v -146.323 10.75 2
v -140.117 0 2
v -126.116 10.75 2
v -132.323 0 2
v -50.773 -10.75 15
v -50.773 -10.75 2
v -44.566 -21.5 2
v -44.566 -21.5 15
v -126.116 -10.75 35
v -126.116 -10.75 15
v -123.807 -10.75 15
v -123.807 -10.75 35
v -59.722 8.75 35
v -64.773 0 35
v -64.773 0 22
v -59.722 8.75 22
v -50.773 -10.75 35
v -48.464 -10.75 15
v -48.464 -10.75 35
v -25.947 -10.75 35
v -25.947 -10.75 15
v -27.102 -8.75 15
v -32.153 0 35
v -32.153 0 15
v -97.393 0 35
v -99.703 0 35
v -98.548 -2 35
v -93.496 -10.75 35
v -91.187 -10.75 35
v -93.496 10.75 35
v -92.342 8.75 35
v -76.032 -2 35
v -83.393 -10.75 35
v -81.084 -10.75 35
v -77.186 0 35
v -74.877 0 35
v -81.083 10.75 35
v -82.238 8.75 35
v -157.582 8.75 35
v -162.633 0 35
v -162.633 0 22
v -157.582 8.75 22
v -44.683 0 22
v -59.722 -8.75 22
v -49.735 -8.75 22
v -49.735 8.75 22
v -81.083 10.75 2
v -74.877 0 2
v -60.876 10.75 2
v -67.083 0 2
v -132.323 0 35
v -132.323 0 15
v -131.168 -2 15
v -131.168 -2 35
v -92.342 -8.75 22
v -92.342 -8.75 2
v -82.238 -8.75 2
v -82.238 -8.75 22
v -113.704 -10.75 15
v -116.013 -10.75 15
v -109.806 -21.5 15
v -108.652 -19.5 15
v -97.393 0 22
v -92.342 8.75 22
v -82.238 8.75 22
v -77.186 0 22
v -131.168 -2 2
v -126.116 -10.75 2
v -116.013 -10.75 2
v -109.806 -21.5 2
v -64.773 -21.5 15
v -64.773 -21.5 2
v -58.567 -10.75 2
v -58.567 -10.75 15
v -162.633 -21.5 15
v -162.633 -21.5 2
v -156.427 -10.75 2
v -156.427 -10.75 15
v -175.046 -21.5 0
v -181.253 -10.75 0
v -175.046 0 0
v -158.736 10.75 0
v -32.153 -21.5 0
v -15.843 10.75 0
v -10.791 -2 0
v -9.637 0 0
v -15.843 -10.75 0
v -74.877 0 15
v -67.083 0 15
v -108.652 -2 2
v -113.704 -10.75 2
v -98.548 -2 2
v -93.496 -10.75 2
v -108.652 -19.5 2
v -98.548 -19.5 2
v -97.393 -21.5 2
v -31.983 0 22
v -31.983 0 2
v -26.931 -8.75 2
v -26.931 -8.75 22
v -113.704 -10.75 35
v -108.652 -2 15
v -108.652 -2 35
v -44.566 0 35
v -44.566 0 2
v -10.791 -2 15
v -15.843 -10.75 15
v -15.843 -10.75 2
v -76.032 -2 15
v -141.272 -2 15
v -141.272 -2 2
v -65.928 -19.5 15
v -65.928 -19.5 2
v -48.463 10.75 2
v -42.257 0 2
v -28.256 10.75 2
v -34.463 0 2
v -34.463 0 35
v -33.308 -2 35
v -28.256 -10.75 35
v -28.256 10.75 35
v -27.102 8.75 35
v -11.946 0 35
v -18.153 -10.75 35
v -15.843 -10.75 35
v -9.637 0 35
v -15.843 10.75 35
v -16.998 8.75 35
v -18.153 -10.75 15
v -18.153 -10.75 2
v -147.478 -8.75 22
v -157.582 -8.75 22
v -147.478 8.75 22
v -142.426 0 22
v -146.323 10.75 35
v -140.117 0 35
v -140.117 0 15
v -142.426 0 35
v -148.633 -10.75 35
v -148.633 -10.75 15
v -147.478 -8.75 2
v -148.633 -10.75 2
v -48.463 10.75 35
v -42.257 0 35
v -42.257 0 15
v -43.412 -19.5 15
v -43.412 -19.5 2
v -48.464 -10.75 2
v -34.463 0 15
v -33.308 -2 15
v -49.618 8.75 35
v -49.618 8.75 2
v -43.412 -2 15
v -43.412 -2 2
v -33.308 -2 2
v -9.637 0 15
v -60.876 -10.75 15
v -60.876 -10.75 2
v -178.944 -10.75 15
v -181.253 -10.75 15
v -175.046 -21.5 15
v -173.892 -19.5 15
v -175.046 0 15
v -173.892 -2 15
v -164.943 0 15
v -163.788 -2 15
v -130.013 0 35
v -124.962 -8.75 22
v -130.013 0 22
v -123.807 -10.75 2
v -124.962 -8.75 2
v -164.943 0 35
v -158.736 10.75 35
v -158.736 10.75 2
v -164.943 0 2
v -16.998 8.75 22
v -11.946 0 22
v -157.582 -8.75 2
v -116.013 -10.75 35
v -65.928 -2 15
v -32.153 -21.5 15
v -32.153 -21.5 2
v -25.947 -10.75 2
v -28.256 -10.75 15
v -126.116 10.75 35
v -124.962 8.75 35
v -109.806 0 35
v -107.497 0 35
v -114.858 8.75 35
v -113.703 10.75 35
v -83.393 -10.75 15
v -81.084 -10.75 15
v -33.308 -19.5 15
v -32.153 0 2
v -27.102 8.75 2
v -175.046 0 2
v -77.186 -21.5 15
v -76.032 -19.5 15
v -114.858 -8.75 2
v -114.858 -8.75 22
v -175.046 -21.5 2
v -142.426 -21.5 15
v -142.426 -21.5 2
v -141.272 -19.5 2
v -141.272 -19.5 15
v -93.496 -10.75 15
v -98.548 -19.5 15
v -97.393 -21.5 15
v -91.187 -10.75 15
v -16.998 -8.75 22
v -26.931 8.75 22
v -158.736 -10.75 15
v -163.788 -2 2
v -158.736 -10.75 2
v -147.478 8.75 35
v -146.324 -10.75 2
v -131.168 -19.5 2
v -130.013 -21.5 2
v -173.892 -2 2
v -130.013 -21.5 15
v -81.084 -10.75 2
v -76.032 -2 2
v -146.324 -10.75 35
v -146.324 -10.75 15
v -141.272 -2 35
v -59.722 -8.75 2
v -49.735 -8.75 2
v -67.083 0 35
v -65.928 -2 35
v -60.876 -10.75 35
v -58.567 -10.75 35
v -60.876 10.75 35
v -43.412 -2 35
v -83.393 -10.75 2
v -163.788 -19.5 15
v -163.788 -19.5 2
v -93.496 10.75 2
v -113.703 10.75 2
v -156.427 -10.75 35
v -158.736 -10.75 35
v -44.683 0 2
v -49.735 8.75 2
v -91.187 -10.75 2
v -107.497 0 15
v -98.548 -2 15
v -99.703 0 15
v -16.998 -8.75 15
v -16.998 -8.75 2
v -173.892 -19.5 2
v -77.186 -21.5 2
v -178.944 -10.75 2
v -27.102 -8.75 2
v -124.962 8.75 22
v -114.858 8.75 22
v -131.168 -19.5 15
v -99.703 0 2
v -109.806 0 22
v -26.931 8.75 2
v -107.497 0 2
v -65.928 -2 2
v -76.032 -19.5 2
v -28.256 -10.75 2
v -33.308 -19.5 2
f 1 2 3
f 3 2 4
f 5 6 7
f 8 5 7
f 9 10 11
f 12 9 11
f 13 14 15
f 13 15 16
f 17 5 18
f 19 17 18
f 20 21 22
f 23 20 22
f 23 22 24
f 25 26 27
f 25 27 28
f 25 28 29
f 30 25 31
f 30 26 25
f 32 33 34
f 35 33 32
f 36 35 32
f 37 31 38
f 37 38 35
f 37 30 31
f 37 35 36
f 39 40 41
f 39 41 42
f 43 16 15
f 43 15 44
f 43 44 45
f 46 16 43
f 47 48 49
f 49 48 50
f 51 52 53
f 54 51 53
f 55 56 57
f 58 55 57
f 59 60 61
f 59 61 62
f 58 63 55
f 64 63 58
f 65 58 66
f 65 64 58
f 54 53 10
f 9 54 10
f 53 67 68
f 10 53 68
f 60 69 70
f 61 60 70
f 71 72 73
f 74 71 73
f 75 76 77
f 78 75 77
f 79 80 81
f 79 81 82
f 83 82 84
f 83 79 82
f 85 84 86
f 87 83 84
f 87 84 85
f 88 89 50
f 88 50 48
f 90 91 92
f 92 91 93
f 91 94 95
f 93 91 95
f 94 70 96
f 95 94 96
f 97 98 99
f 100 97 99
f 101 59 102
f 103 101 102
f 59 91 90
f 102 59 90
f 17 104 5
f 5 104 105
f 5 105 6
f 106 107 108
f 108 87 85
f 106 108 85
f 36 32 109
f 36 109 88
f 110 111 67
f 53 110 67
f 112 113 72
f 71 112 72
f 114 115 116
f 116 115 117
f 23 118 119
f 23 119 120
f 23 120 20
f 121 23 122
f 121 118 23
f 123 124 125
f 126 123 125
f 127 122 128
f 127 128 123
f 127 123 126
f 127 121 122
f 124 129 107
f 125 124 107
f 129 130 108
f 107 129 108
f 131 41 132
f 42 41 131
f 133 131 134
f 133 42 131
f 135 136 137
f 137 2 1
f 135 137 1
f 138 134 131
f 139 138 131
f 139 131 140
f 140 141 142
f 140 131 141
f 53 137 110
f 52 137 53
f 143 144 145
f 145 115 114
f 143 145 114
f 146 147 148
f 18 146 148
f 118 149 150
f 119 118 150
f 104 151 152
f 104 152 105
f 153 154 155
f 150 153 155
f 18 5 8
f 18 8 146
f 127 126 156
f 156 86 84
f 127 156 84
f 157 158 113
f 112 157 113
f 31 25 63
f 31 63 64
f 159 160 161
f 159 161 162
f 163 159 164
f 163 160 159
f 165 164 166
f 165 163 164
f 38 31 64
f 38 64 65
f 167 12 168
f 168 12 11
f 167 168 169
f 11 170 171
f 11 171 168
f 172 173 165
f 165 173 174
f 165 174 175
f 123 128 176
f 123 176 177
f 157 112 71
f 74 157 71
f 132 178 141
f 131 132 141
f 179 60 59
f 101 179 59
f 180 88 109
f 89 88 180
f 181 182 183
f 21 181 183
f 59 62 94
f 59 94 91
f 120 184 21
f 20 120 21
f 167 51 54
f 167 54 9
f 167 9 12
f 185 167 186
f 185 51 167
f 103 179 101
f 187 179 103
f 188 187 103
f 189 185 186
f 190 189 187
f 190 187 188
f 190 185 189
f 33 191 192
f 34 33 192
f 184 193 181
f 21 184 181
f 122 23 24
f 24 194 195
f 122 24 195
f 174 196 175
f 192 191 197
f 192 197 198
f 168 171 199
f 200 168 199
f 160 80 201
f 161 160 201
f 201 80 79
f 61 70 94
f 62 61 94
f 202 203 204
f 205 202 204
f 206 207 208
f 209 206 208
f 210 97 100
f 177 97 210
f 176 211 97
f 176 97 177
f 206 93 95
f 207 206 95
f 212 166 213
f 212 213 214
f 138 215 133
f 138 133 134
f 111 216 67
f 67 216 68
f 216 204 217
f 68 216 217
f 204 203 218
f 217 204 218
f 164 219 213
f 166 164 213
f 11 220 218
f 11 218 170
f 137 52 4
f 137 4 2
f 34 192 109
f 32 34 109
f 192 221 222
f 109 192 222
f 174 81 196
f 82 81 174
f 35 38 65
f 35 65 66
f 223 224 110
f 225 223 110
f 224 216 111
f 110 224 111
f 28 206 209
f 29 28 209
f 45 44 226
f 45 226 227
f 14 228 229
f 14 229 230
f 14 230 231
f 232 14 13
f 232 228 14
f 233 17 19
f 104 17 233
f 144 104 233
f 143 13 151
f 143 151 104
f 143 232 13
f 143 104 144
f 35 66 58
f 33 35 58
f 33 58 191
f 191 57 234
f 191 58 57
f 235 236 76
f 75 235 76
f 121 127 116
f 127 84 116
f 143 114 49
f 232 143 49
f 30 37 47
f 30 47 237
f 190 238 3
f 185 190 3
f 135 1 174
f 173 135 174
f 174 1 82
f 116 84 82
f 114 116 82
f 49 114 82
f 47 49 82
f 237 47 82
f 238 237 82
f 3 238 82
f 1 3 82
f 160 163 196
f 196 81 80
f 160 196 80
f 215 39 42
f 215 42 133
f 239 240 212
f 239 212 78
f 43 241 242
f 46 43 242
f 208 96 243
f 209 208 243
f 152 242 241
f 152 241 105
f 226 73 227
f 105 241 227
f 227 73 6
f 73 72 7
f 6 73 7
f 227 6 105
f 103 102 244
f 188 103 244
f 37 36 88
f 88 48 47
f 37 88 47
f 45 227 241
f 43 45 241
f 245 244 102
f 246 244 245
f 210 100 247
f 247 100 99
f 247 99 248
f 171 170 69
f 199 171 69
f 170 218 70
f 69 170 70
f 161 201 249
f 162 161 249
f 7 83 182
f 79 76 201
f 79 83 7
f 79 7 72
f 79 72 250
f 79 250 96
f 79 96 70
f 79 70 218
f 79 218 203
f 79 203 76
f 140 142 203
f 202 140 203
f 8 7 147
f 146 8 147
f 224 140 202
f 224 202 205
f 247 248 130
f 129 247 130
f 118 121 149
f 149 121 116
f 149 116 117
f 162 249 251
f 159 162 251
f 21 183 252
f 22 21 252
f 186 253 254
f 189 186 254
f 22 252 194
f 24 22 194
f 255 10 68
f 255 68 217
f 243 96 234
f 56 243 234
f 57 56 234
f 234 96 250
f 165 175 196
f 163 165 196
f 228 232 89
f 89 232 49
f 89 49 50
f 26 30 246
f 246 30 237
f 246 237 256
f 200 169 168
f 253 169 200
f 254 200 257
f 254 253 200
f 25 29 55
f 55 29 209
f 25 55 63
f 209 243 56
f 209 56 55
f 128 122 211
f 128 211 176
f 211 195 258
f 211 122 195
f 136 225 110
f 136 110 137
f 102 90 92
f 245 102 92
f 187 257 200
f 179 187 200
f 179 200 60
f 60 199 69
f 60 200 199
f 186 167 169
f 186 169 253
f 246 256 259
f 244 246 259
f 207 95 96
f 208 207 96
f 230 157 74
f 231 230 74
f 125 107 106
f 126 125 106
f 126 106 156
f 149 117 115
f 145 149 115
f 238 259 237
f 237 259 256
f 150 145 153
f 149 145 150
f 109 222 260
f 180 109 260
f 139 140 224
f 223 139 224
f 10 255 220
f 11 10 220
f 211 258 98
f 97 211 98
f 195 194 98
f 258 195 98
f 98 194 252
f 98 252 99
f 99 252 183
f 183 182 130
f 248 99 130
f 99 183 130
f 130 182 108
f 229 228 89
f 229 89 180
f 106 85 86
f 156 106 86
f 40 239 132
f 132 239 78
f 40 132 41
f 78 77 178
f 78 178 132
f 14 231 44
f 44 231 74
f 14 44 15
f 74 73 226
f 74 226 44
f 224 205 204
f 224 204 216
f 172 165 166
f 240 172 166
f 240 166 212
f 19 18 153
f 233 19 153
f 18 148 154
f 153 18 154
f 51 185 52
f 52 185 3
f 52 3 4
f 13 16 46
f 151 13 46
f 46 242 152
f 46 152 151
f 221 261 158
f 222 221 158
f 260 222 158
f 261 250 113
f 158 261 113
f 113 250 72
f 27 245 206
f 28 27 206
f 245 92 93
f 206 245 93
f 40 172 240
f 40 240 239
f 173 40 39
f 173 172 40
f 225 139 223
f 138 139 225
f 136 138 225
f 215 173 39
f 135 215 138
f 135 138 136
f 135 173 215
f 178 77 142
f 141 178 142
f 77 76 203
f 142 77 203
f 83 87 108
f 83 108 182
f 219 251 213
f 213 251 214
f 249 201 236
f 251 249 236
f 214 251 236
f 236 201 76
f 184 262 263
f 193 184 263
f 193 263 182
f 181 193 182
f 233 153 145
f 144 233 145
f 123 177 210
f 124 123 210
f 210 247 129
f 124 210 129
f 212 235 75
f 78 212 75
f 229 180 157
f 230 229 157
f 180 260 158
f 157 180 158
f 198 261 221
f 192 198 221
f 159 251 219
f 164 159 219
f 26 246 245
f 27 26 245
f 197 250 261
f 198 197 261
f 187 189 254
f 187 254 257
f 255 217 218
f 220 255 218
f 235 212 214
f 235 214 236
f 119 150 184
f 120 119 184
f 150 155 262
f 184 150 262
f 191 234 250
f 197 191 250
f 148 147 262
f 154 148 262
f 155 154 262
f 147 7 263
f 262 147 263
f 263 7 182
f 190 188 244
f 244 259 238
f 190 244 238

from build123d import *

# Parameters (mm, degrees)
F1_DEPTH = 15
F3_DEPTH = 2
F5_DEPTH = 20
F7_DEPTH = 20


with BuildPart() as f1:
    # F0 (on Top) → F1 (new body)
    with BuildSketch(Plane.XY):
        Polygon((-43.4116994914, -2), (-33.3080697806, -2), (-28.2562549252, -10.75), (-33.3080697806, -19.5), (-32.1533692422, -21.5), (-25.9468538484, -10.75), (-27.1015543868, -8.75), (-32.1533692422, 0), (-27.1015543868, 8.75), (-22.0497395314, 8.75), (-16.997924676, 8.75), (-11.9461098206, 0), (-14.4720172483, -4.375), (-16.997924676, -8.75), (-18.1526252144, -10.75), (-15.8432241376, -10.75), (-10.7914092822, -2), (-9.6367087438, 0), (-15.8432241376, 10.75), (-22.0497395314, 10.75), (-28.2562549252, 10.75), (-34.462770319, 0), (-42.2567087438, 0), (-48.4632241376, 10.75), (-54.6697395314, 10.75), (-60.8762549252, 10.75), (-67.082770319, 0), (-74.8767087438, 0), (-81.0832241376, 10.75), (-87.2897395314, 10.75), (-93.4962549252, 10.75), (-99.702770319, 0), (-107.4967087438, 0), (-113.7032241376, 10.75), (-119.9097395314, 10.75), (-126.1162549252, 10.75), (-132.322770319, 0), (-140.1167087438, 0), (-146.3232241376, 10.75), (-152.5297395314, 10.75), (-158.7362549252, 10.75), (-164.942770319, 0), (-175.0464000298, 0), (-181.2529154236, -10.75), (-175.0464000298, -21.5), (-173.8916994914, -19.5), (-178.9435143468, -10.75), (-173.8916994914, -2), (-163.7880697806, -2), (-158.7362549252, -10.75), (-163.7880697806, -19.5), (-162.6333692422, -21.5), (-156.4268538484, -10.75), (-162.6333692422, 0), (-157.5815543868, 8.75), (-152.5297395314, 8.75), (-147.477924676, 8.75), (-142.4261098206, 0), (-148.6329154236, -10.75), (-142.4264000298, -21.5), (-141.2716994914, -19.5), (-146.3235143468, -10.75), (-141.2716994914, -2), (-131.1680697806, -2), (-126.1162549252, -10.75), (-131.1680697806, -19.5), (-130.0133692422, -21.5), (-123.8068538484, -10.75), (-130.0133692422, 0), (-124.9615543868, 8.75), (-119.9097395314, 8.75), (-114.857924676, 8.75), (-109.8061098206, 0), (-116.0129154236, -10.75), (-109.8064000298, -21.5), (-108.6516994914, -19.5), (-113.7035143468, -10.75), (-108.6516994914, -2), (-98.5480697806, -2), (-93.4962549252, -10.75), (-98.5480697806, -19.5), (-97.3933692422, -21.5), (-91.1868538484, -10.75), (-97.3933692422, 0), (-92.3415543868, 8.75), (-87.2897395314, 8.75), (-82.237924676, 8.75), (-77.1861098206, 0), (-83.3929154236, -10.75), (-77.1864000298, -21.5), (-76.0316994914, -19.5), (-81.0835143468, -10.75), (-76.0316994914, -2), (-65.9280697806, -2), (-60.8762549252, -10.75), (-65.9280697806, -19.5), (-64.7733692422, -21.5), (-58.5668538484, -10.75), (-64.7733692422, 0), (-59.7215543868, 8.75), (-54.6697395314, 8.75), (-49.617924676, 8.75), (-44.5661098206, 0), (-50.7729154236, -10.75), (-44.5664000298, -21.5), (-43.4116994914, -19.5), (-48.4635143468, -10.75), align=None)
    extrude(amount=F1_DEPTH)

    # F2 (on face) → F3 (join)
    with BuildSketch(Plane(origin=(0, 0, 0), x_dir=(1, 0, 0), z_dir=(0, 0, -1))):
        Polygon((-32.1533692422, 21.5), (-175.0464000298, 21.5), (-181.2529154236, 10.75), (-175.0464000298, 0), (-158.7362549252, -10.75), (-15.8432241376, -10.75), (-9.6367087438, 0), (-15.8432241376, 10.75), align=None)
    extrude(amount=-F3_DEPTH)

    # F4 (on face) → F5 (join)
    with BuildSketch(Plane.XY.offset(15)):
        Polygon((-11.9461098206, 0), (-18.1526252144, -10.75), (-15.8432241376, -10.75), (-9.6367087438, 0), (-15.8432241376, 10.75), (-28.2562549252, 10.75), (-34.462770319, 0), (-33.3080697806, -2), (-28.2562549252, -10.75), (-25.9468538484, -10.75), (-32.1533692422, 0), (-27.1015543868, 8.75), (-16.997924676, 8.75), align=None)
        Polygon((-43.4116994914, -2), (-42.2567087438, 0), (-48.4632241376, 10.75), (-60.8762549252, 10.75), (-67.082770319, 0), (-65.9280697806, -2), (-60.8762549252, -10.75), (-58.5668538484, -10.75), (-64.7733692422, 0), (-59.7215543868, 8.75), (-49.617924676, 8.75), (-44.5661098206, 0), (-50.7729154236, -10.75), (-48.4635143468, -10.75), align=None)
        Polygon((-76.0316994914, -2), (-74.8767087438, 0), (-81.0832241376, 10.75), (-93.4962549252, 10.75), (-99.702770319, 0), (-98.5480697806, -2), (-93.4962549252, -10.75), (-91.1868538484, -10.75), (-97.3933692422, 0), (-92.3415543868, 8.75), (-82.237924676, 8.75), (-77.1861098206, 0), (-83.3929154236, -10.75), (-81.0835143468, -10.75), align=None)
        Polygon((-108.6516994914, -2), (-107.4967087438, 0), (-113.7032241376, 10.75), (-126.1162549252, 10.75), (-132.322770319, 0), (-131.1680697806, -2), (-126.1162549252, -10.75), (-123.8068538484, -10.75), (-130.0133692422, 0), (-124.9615543868, 8.75), (-114.857924676, 8.75), (-109.8061098206, 0), (-116.0129154236, -10.75), (-113.7035143468, -10.75), align=None)
        Polygon((-141.2716994914, -2), (-140.1167087438, 0), (-146.3232241376, 10.75), (-158.7362549252, 10.75), (-164.942770319, 0), (-158.7362549252, -10.75), (-156.4268538484, -10.75), (-162.6333692422, 0), (-157.5815543868, 8.75), (-147.477924676, 8.75), (-142.4261098206, 0), (-148.6329154236, -10.75), (-146.3235143468, -10.75), align=None)
    extrude(amount=F5_DEPTH)

    # F6 (on face) → F7 (join)
    with BuildSketch(Plane.XY.offset(2)):
        Polygon((-147.477924676, 8.75), (-157.5815543868, 8.75), (-162.6333692422, 0), (-157.5815543868, -8.75), (-147.477924676, -8.75), (-142.4261098206, 0), align=None)
        Polygon((-114.857924676, 8.75), (-124.9615543868, 8.75), (-130.0133692422, 0), (-124.9615543868, -8.75), (-114.857924676, -8.75), (-109.8061098206, 0), align=None)
        Polygon((-82.237924676, 8.75), (-92.3415543868, 8.75), (-97.3933692422, 0), (-92.3415543868, -8.75), (-82.237924676, -8.75), (-77.1861098206, 0), align=None)
        Polygon((-44.6827581202, 0), (-49.7345729756, 8.75), (-59.8382026864, 8.75), (-64.8900175418, 0), (-59.8382026864, -8.75), (-49.7345729756, -8.75), align=None)
        Polygon((-16.8277836429, 8.75), (-26.9314133538, 8.75), (-31.9832282092, 0), (-26.9314133538, -8.75), (-16.8277836429, -8.75), (-11.7759687875, 0), align=None)
    extrude(amount=F7_DEPTH)


solid = f1.part
